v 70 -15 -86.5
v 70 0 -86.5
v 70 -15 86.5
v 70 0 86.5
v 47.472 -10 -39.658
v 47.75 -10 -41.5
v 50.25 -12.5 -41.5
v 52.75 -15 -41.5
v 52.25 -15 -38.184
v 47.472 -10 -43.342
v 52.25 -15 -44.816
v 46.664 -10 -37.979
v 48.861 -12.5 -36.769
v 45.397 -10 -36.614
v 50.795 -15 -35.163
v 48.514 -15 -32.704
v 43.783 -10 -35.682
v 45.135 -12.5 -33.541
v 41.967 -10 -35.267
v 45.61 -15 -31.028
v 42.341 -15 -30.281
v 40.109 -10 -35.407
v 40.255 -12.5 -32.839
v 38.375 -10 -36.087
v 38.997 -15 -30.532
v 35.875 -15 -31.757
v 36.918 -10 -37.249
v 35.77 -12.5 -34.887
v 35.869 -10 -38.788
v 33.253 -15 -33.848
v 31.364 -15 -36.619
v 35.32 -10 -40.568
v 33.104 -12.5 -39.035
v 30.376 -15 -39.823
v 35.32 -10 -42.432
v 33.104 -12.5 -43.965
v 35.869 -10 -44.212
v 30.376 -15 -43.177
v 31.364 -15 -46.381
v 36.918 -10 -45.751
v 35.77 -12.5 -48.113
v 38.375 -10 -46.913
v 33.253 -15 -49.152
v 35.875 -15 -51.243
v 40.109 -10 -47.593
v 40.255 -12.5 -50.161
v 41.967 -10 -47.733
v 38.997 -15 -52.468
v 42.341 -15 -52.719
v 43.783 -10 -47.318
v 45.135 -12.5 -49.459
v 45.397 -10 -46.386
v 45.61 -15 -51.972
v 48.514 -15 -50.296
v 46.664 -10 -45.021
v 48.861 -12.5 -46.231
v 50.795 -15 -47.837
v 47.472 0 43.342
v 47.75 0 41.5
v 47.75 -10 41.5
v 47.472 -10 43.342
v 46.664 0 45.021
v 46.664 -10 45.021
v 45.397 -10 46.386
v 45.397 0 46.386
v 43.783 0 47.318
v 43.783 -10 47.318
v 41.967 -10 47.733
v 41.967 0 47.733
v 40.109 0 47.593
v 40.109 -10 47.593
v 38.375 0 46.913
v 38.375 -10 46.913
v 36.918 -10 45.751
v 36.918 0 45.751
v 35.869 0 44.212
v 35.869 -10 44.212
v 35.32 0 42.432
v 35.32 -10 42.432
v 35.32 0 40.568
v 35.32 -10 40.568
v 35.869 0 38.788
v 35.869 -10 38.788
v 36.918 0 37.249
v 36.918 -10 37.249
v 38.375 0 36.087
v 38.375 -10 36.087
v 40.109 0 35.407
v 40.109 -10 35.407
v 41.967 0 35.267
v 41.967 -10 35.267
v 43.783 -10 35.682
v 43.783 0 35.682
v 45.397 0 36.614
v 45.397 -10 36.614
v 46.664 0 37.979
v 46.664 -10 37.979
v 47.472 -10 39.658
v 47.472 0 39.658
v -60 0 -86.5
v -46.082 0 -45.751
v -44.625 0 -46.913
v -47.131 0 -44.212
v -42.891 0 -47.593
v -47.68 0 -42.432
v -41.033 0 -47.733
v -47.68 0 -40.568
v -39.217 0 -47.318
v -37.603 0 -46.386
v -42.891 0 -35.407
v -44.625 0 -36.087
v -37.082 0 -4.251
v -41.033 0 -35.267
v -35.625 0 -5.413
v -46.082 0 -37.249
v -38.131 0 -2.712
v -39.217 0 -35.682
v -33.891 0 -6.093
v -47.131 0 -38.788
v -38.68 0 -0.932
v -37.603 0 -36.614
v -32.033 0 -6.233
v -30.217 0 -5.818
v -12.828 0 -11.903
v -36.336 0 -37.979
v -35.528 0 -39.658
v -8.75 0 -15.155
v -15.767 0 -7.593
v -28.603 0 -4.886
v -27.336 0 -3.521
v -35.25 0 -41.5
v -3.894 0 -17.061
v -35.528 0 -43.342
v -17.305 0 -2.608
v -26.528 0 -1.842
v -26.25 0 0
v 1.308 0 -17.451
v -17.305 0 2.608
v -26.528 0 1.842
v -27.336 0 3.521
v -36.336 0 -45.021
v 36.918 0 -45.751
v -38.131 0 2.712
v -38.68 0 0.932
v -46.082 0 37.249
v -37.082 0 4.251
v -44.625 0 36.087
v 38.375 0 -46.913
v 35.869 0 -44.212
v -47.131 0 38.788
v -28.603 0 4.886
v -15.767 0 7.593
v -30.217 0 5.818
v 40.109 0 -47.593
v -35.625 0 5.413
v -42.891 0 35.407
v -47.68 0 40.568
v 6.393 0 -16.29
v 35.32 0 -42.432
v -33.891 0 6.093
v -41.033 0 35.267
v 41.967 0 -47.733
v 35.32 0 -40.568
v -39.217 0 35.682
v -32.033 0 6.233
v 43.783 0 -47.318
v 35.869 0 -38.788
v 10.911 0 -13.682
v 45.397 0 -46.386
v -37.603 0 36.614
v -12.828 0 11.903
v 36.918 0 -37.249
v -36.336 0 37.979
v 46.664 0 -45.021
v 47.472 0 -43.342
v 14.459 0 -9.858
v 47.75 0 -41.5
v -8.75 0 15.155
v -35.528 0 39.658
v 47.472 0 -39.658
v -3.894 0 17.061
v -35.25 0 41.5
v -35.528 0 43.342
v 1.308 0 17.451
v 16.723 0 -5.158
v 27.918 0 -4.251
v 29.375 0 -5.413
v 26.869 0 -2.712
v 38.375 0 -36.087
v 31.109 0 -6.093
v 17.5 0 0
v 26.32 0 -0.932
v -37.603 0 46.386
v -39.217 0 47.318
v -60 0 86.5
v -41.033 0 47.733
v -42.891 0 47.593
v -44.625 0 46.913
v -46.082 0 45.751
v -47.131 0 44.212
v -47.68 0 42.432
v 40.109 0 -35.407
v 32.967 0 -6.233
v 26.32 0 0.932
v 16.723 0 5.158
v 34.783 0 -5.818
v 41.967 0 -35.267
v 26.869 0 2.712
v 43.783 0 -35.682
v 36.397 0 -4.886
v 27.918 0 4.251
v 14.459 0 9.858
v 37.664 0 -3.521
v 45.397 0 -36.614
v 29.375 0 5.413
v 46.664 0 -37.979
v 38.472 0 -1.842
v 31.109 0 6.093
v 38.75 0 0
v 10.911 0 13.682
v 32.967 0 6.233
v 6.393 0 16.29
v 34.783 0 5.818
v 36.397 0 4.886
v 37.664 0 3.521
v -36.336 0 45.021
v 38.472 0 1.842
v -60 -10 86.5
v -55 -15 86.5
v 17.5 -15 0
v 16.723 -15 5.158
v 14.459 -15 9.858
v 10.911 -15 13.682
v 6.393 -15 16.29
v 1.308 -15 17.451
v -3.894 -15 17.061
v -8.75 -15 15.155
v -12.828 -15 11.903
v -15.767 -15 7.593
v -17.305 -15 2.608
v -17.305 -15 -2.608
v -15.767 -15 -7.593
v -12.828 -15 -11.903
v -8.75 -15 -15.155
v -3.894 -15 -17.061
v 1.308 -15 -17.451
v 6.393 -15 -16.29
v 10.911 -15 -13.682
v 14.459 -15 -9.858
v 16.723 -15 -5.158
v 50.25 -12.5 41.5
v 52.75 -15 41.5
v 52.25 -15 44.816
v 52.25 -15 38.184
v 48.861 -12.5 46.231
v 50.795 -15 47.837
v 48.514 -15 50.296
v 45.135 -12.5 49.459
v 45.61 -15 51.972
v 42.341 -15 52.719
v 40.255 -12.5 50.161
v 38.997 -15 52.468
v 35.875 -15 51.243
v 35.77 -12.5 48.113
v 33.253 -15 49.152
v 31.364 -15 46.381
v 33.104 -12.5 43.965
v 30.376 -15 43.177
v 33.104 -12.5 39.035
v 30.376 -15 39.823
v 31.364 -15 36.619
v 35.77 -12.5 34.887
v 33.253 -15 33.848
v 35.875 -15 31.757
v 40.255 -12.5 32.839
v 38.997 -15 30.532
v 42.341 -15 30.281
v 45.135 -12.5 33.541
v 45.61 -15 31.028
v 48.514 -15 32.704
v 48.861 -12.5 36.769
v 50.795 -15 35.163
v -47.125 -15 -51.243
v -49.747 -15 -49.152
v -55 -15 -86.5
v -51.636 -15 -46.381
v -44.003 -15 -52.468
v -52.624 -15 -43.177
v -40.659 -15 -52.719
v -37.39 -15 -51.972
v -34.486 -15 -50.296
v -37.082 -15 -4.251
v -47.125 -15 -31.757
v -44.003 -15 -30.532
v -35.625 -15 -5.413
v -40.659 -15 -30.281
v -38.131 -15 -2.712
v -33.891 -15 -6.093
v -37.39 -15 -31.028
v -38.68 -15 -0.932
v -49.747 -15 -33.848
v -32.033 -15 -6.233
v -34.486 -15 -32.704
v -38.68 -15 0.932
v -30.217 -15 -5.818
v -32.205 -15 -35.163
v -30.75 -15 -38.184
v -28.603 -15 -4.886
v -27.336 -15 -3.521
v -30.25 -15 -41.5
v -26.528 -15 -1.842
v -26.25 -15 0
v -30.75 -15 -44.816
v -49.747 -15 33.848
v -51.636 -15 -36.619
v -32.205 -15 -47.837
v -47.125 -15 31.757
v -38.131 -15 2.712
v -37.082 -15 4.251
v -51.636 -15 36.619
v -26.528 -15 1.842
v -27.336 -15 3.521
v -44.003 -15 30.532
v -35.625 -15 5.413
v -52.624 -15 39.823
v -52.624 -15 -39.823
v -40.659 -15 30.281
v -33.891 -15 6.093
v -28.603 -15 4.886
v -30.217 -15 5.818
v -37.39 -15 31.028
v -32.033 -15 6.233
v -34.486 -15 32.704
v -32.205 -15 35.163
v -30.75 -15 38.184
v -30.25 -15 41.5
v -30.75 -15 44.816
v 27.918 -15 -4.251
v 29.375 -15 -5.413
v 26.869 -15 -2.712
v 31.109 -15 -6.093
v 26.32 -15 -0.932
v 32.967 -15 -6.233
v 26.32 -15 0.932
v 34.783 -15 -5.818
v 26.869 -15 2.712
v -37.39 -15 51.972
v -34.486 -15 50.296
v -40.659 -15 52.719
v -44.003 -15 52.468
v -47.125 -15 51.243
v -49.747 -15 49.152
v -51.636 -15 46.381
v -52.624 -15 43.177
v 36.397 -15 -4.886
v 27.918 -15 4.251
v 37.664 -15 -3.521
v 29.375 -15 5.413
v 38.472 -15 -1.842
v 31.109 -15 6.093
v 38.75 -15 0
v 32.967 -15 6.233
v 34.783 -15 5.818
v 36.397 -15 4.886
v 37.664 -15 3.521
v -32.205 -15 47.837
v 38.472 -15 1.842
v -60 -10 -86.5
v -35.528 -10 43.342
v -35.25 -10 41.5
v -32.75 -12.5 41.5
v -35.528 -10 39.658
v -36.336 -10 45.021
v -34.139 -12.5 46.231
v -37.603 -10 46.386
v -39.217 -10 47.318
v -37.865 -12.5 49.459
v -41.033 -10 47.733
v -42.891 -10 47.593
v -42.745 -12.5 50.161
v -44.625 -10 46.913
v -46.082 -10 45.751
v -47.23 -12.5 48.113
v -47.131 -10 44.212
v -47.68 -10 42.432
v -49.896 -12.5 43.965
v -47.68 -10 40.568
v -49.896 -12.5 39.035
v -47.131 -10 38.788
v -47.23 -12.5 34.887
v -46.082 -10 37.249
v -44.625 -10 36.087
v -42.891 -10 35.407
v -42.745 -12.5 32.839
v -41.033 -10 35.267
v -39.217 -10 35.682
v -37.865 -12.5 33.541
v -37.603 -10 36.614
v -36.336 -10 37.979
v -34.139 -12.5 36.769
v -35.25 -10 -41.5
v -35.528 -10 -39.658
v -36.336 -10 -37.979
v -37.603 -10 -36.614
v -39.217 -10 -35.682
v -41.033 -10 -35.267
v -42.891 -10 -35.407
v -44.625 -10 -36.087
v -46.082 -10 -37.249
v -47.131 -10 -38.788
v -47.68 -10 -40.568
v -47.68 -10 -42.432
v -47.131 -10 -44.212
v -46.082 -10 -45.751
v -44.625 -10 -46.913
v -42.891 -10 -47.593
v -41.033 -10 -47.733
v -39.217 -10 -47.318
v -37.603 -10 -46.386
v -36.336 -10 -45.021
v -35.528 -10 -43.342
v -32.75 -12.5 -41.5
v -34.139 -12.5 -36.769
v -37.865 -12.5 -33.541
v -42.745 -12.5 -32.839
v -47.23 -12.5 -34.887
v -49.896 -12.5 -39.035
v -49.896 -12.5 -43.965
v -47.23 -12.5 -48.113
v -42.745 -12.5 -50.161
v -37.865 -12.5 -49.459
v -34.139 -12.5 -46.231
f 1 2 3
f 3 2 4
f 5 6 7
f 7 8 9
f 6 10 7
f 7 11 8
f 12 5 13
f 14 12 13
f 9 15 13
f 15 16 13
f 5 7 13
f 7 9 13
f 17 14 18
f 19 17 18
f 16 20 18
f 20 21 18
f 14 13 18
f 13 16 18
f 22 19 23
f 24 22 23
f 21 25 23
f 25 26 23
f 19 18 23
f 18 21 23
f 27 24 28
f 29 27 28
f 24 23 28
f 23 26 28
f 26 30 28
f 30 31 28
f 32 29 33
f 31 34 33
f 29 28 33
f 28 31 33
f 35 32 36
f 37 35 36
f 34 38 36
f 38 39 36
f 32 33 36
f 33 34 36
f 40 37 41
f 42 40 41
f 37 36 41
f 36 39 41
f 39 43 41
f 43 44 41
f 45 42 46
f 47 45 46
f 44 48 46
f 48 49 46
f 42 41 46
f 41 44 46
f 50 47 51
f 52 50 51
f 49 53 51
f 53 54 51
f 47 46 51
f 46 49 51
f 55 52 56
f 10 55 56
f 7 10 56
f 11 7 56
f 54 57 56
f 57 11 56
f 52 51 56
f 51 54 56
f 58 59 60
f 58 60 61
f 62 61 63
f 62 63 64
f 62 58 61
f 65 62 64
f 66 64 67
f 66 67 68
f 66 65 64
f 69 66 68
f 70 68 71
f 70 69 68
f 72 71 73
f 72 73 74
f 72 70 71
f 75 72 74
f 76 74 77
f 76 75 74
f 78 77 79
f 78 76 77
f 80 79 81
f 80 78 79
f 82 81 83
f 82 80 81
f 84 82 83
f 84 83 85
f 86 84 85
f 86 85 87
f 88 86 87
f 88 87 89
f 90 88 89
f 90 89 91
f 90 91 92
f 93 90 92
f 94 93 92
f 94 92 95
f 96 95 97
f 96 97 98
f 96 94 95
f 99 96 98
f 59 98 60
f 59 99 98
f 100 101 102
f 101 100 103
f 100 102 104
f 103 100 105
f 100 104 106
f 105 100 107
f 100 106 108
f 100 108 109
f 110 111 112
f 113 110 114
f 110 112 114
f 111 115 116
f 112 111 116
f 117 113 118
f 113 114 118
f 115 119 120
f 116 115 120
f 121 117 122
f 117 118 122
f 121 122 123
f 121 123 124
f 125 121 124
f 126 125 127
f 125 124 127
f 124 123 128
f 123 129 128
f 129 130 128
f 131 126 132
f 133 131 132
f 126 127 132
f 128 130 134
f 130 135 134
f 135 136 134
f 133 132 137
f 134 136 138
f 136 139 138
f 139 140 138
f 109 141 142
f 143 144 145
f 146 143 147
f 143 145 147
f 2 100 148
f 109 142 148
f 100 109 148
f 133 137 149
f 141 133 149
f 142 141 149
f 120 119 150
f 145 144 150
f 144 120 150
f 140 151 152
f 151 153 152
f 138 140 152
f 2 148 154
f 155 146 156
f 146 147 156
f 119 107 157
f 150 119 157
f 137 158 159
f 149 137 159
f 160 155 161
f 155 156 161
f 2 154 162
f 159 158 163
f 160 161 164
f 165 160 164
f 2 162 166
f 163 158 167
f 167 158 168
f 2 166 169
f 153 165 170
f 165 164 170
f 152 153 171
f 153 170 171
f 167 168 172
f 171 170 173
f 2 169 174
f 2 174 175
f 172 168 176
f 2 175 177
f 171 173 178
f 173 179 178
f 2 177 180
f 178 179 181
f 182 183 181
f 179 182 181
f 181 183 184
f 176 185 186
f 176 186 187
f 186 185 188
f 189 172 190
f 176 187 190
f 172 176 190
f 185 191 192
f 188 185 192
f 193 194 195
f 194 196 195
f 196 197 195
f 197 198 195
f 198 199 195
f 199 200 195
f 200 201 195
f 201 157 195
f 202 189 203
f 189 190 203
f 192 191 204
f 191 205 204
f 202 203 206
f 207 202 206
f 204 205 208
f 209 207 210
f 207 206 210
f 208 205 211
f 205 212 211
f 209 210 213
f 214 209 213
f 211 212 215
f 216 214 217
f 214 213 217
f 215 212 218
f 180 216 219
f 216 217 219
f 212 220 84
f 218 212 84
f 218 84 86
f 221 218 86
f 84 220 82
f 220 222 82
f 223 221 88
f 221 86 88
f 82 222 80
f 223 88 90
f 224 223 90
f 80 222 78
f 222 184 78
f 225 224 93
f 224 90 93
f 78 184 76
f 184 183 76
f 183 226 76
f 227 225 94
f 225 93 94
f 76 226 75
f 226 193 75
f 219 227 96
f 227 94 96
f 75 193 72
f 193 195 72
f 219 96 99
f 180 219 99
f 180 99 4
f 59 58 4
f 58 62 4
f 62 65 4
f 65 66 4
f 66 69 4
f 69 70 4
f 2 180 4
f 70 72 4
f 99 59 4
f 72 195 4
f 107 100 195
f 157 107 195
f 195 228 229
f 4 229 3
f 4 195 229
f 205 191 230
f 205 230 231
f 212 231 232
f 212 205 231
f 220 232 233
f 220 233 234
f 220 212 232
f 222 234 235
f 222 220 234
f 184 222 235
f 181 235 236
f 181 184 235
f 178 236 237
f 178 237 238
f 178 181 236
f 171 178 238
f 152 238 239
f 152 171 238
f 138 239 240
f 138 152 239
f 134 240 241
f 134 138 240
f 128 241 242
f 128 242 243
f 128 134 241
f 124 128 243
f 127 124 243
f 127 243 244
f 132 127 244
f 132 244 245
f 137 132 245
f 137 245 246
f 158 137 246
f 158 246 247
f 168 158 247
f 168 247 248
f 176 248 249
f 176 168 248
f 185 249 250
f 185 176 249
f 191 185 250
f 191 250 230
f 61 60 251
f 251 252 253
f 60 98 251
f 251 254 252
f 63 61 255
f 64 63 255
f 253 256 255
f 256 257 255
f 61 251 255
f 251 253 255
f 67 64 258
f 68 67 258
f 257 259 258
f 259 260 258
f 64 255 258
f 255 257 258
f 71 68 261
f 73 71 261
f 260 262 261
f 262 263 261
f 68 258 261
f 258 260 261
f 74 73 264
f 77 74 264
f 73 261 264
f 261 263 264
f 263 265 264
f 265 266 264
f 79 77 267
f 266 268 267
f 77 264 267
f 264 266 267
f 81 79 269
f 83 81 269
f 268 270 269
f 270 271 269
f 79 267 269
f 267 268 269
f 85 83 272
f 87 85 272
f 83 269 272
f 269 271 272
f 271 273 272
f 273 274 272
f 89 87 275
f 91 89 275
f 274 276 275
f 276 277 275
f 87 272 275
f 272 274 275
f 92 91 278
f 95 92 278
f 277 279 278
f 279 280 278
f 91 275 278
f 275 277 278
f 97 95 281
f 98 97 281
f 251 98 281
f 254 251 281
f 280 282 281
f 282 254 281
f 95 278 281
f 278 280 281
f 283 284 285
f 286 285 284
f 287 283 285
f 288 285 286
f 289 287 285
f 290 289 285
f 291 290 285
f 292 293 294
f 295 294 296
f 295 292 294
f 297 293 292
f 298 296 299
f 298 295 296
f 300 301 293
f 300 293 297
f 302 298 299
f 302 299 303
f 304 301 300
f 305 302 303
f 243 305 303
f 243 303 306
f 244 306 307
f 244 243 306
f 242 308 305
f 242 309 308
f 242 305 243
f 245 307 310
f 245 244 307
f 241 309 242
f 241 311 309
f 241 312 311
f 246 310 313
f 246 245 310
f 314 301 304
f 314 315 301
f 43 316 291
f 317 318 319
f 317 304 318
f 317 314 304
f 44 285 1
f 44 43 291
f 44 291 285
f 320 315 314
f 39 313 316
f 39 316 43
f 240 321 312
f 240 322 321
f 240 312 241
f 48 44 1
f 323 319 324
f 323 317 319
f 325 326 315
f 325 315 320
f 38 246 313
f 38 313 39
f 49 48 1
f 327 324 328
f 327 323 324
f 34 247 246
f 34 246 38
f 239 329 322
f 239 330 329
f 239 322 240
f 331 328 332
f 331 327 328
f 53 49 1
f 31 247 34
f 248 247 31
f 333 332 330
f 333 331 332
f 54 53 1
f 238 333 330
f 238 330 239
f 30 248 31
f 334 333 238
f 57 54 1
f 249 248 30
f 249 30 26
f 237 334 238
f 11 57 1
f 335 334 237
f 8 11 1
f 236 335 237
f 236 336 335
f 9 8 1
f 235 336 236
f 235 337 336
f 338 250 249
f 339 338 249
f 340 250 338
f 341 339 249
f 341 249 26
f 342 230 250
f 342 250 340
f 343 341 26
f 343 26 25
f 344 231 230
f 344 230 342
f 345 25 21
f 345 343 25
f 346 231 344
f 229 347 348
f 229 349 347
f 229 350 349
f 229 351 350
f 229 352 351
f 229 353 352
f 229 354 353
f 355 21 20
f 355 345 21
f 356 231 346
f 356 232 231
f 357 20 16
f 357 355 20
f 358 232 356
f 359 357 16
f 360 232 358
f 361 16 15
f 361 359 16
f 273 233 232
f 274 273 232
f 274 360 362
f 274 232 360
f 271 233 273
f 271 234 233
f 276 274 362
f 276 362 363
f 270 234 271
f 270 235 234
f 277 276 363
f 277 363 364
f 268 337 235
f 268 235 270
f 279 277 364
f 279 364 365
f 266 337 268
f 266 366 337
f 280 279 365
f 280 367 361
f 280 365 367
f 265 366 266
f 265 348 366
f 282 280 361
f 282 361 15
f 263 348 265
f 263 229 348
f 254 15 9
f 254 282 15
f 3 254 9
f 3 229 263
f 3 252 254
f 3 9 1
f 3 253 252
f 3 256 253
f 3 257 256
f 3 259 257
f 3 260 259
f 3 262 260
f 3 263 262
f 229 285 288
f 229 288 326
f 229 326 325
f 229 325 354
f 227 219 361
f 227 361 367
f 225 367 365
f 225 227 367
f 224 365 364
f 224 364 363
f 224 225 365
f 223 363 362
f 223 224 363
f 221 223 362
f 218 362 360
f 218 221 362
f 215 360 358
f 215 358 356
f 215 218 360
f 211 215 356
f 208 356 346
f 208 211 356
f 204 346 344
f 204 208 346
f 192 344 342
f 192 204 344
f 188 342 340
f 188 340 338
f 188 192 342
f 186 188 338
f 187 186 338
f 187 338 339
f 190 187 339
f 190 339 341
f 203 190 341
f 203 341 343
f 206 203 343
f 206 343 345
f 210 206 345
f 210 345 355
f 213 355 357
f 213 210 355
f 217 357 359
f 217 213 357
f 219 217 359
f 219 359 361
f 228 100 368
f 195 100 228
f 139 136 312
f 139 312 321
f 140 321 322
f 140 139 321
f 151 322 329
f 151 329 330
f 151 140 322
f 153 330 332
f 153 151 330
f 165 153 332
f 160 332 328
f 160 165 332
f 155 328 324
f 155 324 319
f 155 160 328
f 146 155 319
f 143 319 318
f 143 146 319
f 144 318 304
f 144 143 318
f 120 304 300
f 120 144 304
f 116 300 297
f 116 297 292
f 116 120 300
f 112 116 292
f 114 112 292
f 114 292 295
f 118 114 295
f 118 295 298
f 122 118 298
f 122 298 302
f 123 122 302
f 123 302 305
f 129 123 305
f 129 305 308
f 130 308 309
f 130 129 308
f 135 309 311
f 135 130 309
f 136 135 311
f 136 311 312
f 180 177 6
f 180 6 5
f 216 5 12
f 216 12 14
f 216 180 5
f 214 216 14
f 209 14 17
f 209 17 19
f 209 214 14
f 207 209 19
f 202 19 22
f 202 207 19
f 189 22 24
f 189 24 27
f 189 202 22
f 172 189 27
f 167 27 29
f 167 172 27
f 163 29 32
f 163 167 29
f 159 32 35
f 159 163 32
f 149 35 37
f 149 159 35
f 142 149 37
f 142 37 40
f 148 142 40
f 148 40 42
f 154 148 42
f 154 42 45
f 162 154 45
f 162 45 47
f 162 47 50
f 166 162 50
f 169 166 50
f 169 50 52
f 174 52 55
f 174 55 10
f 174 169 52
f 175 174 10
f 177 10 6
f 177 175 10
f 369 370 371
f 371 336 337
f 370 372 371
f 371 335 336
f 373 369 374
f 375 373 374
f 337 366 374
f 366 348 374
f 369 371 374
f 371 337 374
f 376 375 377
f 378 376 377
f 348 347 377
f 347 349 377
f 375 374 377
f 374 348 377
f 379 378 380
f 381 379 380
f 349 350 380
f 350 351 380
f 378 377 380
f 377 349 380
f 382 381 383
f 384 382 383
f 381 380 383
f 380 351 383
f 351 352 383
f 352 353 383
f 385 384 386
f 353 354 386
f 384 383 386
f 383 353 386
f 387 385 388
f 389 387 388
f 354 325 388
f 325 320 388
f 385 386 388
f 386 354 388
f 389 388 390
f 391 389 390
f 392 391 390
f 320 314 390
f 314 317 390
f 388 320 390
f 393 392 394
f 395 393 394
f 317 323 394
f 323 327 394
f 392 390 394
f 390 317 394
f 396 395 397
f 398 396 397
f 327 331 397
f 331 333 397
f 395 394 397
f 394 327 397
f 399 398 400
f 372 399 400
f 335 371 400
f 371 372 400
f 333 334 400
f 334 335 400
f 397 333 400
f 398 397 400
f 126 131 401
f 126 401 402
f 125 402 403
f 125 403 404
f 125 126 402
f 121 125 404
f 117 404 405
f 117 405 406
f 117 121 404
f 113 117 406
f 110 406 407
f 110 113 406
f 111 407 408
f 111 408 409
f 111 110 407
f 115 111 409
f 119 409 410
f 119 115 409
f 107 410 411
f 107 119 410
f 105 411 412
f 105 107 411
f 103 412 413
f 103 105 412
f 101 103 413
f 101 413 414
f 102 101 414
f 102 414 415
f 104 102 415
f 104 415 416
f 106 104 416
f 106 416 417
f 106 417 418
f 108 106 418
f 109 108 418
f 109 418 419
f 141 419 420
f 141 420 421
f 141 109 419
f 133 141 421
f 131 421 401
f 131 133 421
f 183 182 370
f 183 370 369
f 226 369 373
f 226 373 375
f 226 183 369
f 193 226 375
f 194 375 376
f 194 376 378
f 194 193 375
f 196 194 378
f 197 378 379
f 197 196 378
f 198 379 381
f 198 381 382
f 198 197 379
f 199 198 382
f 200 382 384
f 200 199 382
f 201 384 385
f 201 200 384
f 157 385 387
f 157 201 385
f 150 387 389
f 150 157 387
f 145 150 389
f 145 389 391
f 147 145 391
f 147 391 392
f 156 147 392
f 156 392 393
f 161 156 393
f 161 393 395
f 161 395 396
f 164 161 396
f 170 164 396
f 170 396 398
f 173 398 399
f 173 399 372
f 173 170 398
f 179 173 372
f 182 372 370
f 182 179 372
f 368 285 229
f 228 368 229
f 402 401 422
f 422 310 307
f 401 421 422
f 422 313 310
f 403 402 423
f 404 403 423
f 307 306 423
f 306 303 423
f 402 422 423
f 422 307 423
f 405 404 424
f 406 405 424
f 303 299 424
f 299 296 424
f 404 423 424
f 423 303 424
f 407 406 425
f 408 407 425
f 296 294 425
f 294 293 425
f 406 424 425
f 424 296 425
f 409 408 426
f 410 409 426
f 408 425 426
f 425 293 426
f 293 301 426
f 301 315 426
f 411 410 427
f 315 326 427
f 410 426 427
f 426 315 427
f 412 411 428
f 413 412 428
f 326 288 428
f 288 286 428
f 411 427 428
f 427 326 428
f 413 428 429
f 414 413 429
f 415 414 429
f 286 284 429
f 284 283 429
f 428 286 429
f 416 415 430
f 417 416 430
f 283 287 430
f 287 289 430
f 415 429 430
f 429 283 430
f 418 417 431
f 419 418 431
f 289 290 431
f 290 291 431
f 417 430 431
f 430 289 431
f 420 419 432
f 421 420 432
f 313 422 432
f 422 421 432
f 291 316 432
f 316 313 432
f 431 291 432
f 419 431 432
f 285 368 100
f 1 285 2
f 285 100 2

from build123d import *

# Parameters (mm, degrees)
F0_W     = 130
F0_H     = 173
F0_R     = 6.25
F0_R_2   = 17.5
F1_DEPTH = 15
F2_SIZE2 = 5
F2_SIZE  = 5


with BuildPart() as f1:
    # F0 (on Front) → F1 (new body)
    with BuildSketch(Plane.XZ):
        with Locations((5, 0)):
            Rectangle(F0_W, F0_H)
        with Locations((-41.5, -41.5)):
            Circle(F0_R, mode=Mode.SUBTRACT)
        with Locations((41.5, -41.5)):
            Circle(F0_R, mode=Mode.SUBTRACT)
        with Locations((-32.5, 0)):
            Circle(F0_R, mode=Mode.SUBTRACT)
        with Locations((-41.5, 41.5)):
            Circle(F0_R, mode=Mode.SUBTRACT)
        Circle(F0_R_2, mode=Mode.SUBTRACT)
        with Locations((32.5, 0)):
            Circle(F0_R, mode=Mode.SUBTRACT)
        with Locations((41.5, 41.5)):
            Circle(F0_R, mode=Mode.SUBTRACT)
    extrude(amount=F1_DEPTH)

    # F2
    f2_edges = [f1.edges().sort_by_distance(p)[0] for p in [
        (-47.75, -15, 41.5),
        (35.25, -15, 41.5),
        (-47.75, -15, -41.5),
        (35.25, -15, -41.5),
        (-60, -15, 0),
    ]]
    chamfer(f2_edges, length=F2_SIZE, length2=F2_SIZE2)


solid = f1.part
